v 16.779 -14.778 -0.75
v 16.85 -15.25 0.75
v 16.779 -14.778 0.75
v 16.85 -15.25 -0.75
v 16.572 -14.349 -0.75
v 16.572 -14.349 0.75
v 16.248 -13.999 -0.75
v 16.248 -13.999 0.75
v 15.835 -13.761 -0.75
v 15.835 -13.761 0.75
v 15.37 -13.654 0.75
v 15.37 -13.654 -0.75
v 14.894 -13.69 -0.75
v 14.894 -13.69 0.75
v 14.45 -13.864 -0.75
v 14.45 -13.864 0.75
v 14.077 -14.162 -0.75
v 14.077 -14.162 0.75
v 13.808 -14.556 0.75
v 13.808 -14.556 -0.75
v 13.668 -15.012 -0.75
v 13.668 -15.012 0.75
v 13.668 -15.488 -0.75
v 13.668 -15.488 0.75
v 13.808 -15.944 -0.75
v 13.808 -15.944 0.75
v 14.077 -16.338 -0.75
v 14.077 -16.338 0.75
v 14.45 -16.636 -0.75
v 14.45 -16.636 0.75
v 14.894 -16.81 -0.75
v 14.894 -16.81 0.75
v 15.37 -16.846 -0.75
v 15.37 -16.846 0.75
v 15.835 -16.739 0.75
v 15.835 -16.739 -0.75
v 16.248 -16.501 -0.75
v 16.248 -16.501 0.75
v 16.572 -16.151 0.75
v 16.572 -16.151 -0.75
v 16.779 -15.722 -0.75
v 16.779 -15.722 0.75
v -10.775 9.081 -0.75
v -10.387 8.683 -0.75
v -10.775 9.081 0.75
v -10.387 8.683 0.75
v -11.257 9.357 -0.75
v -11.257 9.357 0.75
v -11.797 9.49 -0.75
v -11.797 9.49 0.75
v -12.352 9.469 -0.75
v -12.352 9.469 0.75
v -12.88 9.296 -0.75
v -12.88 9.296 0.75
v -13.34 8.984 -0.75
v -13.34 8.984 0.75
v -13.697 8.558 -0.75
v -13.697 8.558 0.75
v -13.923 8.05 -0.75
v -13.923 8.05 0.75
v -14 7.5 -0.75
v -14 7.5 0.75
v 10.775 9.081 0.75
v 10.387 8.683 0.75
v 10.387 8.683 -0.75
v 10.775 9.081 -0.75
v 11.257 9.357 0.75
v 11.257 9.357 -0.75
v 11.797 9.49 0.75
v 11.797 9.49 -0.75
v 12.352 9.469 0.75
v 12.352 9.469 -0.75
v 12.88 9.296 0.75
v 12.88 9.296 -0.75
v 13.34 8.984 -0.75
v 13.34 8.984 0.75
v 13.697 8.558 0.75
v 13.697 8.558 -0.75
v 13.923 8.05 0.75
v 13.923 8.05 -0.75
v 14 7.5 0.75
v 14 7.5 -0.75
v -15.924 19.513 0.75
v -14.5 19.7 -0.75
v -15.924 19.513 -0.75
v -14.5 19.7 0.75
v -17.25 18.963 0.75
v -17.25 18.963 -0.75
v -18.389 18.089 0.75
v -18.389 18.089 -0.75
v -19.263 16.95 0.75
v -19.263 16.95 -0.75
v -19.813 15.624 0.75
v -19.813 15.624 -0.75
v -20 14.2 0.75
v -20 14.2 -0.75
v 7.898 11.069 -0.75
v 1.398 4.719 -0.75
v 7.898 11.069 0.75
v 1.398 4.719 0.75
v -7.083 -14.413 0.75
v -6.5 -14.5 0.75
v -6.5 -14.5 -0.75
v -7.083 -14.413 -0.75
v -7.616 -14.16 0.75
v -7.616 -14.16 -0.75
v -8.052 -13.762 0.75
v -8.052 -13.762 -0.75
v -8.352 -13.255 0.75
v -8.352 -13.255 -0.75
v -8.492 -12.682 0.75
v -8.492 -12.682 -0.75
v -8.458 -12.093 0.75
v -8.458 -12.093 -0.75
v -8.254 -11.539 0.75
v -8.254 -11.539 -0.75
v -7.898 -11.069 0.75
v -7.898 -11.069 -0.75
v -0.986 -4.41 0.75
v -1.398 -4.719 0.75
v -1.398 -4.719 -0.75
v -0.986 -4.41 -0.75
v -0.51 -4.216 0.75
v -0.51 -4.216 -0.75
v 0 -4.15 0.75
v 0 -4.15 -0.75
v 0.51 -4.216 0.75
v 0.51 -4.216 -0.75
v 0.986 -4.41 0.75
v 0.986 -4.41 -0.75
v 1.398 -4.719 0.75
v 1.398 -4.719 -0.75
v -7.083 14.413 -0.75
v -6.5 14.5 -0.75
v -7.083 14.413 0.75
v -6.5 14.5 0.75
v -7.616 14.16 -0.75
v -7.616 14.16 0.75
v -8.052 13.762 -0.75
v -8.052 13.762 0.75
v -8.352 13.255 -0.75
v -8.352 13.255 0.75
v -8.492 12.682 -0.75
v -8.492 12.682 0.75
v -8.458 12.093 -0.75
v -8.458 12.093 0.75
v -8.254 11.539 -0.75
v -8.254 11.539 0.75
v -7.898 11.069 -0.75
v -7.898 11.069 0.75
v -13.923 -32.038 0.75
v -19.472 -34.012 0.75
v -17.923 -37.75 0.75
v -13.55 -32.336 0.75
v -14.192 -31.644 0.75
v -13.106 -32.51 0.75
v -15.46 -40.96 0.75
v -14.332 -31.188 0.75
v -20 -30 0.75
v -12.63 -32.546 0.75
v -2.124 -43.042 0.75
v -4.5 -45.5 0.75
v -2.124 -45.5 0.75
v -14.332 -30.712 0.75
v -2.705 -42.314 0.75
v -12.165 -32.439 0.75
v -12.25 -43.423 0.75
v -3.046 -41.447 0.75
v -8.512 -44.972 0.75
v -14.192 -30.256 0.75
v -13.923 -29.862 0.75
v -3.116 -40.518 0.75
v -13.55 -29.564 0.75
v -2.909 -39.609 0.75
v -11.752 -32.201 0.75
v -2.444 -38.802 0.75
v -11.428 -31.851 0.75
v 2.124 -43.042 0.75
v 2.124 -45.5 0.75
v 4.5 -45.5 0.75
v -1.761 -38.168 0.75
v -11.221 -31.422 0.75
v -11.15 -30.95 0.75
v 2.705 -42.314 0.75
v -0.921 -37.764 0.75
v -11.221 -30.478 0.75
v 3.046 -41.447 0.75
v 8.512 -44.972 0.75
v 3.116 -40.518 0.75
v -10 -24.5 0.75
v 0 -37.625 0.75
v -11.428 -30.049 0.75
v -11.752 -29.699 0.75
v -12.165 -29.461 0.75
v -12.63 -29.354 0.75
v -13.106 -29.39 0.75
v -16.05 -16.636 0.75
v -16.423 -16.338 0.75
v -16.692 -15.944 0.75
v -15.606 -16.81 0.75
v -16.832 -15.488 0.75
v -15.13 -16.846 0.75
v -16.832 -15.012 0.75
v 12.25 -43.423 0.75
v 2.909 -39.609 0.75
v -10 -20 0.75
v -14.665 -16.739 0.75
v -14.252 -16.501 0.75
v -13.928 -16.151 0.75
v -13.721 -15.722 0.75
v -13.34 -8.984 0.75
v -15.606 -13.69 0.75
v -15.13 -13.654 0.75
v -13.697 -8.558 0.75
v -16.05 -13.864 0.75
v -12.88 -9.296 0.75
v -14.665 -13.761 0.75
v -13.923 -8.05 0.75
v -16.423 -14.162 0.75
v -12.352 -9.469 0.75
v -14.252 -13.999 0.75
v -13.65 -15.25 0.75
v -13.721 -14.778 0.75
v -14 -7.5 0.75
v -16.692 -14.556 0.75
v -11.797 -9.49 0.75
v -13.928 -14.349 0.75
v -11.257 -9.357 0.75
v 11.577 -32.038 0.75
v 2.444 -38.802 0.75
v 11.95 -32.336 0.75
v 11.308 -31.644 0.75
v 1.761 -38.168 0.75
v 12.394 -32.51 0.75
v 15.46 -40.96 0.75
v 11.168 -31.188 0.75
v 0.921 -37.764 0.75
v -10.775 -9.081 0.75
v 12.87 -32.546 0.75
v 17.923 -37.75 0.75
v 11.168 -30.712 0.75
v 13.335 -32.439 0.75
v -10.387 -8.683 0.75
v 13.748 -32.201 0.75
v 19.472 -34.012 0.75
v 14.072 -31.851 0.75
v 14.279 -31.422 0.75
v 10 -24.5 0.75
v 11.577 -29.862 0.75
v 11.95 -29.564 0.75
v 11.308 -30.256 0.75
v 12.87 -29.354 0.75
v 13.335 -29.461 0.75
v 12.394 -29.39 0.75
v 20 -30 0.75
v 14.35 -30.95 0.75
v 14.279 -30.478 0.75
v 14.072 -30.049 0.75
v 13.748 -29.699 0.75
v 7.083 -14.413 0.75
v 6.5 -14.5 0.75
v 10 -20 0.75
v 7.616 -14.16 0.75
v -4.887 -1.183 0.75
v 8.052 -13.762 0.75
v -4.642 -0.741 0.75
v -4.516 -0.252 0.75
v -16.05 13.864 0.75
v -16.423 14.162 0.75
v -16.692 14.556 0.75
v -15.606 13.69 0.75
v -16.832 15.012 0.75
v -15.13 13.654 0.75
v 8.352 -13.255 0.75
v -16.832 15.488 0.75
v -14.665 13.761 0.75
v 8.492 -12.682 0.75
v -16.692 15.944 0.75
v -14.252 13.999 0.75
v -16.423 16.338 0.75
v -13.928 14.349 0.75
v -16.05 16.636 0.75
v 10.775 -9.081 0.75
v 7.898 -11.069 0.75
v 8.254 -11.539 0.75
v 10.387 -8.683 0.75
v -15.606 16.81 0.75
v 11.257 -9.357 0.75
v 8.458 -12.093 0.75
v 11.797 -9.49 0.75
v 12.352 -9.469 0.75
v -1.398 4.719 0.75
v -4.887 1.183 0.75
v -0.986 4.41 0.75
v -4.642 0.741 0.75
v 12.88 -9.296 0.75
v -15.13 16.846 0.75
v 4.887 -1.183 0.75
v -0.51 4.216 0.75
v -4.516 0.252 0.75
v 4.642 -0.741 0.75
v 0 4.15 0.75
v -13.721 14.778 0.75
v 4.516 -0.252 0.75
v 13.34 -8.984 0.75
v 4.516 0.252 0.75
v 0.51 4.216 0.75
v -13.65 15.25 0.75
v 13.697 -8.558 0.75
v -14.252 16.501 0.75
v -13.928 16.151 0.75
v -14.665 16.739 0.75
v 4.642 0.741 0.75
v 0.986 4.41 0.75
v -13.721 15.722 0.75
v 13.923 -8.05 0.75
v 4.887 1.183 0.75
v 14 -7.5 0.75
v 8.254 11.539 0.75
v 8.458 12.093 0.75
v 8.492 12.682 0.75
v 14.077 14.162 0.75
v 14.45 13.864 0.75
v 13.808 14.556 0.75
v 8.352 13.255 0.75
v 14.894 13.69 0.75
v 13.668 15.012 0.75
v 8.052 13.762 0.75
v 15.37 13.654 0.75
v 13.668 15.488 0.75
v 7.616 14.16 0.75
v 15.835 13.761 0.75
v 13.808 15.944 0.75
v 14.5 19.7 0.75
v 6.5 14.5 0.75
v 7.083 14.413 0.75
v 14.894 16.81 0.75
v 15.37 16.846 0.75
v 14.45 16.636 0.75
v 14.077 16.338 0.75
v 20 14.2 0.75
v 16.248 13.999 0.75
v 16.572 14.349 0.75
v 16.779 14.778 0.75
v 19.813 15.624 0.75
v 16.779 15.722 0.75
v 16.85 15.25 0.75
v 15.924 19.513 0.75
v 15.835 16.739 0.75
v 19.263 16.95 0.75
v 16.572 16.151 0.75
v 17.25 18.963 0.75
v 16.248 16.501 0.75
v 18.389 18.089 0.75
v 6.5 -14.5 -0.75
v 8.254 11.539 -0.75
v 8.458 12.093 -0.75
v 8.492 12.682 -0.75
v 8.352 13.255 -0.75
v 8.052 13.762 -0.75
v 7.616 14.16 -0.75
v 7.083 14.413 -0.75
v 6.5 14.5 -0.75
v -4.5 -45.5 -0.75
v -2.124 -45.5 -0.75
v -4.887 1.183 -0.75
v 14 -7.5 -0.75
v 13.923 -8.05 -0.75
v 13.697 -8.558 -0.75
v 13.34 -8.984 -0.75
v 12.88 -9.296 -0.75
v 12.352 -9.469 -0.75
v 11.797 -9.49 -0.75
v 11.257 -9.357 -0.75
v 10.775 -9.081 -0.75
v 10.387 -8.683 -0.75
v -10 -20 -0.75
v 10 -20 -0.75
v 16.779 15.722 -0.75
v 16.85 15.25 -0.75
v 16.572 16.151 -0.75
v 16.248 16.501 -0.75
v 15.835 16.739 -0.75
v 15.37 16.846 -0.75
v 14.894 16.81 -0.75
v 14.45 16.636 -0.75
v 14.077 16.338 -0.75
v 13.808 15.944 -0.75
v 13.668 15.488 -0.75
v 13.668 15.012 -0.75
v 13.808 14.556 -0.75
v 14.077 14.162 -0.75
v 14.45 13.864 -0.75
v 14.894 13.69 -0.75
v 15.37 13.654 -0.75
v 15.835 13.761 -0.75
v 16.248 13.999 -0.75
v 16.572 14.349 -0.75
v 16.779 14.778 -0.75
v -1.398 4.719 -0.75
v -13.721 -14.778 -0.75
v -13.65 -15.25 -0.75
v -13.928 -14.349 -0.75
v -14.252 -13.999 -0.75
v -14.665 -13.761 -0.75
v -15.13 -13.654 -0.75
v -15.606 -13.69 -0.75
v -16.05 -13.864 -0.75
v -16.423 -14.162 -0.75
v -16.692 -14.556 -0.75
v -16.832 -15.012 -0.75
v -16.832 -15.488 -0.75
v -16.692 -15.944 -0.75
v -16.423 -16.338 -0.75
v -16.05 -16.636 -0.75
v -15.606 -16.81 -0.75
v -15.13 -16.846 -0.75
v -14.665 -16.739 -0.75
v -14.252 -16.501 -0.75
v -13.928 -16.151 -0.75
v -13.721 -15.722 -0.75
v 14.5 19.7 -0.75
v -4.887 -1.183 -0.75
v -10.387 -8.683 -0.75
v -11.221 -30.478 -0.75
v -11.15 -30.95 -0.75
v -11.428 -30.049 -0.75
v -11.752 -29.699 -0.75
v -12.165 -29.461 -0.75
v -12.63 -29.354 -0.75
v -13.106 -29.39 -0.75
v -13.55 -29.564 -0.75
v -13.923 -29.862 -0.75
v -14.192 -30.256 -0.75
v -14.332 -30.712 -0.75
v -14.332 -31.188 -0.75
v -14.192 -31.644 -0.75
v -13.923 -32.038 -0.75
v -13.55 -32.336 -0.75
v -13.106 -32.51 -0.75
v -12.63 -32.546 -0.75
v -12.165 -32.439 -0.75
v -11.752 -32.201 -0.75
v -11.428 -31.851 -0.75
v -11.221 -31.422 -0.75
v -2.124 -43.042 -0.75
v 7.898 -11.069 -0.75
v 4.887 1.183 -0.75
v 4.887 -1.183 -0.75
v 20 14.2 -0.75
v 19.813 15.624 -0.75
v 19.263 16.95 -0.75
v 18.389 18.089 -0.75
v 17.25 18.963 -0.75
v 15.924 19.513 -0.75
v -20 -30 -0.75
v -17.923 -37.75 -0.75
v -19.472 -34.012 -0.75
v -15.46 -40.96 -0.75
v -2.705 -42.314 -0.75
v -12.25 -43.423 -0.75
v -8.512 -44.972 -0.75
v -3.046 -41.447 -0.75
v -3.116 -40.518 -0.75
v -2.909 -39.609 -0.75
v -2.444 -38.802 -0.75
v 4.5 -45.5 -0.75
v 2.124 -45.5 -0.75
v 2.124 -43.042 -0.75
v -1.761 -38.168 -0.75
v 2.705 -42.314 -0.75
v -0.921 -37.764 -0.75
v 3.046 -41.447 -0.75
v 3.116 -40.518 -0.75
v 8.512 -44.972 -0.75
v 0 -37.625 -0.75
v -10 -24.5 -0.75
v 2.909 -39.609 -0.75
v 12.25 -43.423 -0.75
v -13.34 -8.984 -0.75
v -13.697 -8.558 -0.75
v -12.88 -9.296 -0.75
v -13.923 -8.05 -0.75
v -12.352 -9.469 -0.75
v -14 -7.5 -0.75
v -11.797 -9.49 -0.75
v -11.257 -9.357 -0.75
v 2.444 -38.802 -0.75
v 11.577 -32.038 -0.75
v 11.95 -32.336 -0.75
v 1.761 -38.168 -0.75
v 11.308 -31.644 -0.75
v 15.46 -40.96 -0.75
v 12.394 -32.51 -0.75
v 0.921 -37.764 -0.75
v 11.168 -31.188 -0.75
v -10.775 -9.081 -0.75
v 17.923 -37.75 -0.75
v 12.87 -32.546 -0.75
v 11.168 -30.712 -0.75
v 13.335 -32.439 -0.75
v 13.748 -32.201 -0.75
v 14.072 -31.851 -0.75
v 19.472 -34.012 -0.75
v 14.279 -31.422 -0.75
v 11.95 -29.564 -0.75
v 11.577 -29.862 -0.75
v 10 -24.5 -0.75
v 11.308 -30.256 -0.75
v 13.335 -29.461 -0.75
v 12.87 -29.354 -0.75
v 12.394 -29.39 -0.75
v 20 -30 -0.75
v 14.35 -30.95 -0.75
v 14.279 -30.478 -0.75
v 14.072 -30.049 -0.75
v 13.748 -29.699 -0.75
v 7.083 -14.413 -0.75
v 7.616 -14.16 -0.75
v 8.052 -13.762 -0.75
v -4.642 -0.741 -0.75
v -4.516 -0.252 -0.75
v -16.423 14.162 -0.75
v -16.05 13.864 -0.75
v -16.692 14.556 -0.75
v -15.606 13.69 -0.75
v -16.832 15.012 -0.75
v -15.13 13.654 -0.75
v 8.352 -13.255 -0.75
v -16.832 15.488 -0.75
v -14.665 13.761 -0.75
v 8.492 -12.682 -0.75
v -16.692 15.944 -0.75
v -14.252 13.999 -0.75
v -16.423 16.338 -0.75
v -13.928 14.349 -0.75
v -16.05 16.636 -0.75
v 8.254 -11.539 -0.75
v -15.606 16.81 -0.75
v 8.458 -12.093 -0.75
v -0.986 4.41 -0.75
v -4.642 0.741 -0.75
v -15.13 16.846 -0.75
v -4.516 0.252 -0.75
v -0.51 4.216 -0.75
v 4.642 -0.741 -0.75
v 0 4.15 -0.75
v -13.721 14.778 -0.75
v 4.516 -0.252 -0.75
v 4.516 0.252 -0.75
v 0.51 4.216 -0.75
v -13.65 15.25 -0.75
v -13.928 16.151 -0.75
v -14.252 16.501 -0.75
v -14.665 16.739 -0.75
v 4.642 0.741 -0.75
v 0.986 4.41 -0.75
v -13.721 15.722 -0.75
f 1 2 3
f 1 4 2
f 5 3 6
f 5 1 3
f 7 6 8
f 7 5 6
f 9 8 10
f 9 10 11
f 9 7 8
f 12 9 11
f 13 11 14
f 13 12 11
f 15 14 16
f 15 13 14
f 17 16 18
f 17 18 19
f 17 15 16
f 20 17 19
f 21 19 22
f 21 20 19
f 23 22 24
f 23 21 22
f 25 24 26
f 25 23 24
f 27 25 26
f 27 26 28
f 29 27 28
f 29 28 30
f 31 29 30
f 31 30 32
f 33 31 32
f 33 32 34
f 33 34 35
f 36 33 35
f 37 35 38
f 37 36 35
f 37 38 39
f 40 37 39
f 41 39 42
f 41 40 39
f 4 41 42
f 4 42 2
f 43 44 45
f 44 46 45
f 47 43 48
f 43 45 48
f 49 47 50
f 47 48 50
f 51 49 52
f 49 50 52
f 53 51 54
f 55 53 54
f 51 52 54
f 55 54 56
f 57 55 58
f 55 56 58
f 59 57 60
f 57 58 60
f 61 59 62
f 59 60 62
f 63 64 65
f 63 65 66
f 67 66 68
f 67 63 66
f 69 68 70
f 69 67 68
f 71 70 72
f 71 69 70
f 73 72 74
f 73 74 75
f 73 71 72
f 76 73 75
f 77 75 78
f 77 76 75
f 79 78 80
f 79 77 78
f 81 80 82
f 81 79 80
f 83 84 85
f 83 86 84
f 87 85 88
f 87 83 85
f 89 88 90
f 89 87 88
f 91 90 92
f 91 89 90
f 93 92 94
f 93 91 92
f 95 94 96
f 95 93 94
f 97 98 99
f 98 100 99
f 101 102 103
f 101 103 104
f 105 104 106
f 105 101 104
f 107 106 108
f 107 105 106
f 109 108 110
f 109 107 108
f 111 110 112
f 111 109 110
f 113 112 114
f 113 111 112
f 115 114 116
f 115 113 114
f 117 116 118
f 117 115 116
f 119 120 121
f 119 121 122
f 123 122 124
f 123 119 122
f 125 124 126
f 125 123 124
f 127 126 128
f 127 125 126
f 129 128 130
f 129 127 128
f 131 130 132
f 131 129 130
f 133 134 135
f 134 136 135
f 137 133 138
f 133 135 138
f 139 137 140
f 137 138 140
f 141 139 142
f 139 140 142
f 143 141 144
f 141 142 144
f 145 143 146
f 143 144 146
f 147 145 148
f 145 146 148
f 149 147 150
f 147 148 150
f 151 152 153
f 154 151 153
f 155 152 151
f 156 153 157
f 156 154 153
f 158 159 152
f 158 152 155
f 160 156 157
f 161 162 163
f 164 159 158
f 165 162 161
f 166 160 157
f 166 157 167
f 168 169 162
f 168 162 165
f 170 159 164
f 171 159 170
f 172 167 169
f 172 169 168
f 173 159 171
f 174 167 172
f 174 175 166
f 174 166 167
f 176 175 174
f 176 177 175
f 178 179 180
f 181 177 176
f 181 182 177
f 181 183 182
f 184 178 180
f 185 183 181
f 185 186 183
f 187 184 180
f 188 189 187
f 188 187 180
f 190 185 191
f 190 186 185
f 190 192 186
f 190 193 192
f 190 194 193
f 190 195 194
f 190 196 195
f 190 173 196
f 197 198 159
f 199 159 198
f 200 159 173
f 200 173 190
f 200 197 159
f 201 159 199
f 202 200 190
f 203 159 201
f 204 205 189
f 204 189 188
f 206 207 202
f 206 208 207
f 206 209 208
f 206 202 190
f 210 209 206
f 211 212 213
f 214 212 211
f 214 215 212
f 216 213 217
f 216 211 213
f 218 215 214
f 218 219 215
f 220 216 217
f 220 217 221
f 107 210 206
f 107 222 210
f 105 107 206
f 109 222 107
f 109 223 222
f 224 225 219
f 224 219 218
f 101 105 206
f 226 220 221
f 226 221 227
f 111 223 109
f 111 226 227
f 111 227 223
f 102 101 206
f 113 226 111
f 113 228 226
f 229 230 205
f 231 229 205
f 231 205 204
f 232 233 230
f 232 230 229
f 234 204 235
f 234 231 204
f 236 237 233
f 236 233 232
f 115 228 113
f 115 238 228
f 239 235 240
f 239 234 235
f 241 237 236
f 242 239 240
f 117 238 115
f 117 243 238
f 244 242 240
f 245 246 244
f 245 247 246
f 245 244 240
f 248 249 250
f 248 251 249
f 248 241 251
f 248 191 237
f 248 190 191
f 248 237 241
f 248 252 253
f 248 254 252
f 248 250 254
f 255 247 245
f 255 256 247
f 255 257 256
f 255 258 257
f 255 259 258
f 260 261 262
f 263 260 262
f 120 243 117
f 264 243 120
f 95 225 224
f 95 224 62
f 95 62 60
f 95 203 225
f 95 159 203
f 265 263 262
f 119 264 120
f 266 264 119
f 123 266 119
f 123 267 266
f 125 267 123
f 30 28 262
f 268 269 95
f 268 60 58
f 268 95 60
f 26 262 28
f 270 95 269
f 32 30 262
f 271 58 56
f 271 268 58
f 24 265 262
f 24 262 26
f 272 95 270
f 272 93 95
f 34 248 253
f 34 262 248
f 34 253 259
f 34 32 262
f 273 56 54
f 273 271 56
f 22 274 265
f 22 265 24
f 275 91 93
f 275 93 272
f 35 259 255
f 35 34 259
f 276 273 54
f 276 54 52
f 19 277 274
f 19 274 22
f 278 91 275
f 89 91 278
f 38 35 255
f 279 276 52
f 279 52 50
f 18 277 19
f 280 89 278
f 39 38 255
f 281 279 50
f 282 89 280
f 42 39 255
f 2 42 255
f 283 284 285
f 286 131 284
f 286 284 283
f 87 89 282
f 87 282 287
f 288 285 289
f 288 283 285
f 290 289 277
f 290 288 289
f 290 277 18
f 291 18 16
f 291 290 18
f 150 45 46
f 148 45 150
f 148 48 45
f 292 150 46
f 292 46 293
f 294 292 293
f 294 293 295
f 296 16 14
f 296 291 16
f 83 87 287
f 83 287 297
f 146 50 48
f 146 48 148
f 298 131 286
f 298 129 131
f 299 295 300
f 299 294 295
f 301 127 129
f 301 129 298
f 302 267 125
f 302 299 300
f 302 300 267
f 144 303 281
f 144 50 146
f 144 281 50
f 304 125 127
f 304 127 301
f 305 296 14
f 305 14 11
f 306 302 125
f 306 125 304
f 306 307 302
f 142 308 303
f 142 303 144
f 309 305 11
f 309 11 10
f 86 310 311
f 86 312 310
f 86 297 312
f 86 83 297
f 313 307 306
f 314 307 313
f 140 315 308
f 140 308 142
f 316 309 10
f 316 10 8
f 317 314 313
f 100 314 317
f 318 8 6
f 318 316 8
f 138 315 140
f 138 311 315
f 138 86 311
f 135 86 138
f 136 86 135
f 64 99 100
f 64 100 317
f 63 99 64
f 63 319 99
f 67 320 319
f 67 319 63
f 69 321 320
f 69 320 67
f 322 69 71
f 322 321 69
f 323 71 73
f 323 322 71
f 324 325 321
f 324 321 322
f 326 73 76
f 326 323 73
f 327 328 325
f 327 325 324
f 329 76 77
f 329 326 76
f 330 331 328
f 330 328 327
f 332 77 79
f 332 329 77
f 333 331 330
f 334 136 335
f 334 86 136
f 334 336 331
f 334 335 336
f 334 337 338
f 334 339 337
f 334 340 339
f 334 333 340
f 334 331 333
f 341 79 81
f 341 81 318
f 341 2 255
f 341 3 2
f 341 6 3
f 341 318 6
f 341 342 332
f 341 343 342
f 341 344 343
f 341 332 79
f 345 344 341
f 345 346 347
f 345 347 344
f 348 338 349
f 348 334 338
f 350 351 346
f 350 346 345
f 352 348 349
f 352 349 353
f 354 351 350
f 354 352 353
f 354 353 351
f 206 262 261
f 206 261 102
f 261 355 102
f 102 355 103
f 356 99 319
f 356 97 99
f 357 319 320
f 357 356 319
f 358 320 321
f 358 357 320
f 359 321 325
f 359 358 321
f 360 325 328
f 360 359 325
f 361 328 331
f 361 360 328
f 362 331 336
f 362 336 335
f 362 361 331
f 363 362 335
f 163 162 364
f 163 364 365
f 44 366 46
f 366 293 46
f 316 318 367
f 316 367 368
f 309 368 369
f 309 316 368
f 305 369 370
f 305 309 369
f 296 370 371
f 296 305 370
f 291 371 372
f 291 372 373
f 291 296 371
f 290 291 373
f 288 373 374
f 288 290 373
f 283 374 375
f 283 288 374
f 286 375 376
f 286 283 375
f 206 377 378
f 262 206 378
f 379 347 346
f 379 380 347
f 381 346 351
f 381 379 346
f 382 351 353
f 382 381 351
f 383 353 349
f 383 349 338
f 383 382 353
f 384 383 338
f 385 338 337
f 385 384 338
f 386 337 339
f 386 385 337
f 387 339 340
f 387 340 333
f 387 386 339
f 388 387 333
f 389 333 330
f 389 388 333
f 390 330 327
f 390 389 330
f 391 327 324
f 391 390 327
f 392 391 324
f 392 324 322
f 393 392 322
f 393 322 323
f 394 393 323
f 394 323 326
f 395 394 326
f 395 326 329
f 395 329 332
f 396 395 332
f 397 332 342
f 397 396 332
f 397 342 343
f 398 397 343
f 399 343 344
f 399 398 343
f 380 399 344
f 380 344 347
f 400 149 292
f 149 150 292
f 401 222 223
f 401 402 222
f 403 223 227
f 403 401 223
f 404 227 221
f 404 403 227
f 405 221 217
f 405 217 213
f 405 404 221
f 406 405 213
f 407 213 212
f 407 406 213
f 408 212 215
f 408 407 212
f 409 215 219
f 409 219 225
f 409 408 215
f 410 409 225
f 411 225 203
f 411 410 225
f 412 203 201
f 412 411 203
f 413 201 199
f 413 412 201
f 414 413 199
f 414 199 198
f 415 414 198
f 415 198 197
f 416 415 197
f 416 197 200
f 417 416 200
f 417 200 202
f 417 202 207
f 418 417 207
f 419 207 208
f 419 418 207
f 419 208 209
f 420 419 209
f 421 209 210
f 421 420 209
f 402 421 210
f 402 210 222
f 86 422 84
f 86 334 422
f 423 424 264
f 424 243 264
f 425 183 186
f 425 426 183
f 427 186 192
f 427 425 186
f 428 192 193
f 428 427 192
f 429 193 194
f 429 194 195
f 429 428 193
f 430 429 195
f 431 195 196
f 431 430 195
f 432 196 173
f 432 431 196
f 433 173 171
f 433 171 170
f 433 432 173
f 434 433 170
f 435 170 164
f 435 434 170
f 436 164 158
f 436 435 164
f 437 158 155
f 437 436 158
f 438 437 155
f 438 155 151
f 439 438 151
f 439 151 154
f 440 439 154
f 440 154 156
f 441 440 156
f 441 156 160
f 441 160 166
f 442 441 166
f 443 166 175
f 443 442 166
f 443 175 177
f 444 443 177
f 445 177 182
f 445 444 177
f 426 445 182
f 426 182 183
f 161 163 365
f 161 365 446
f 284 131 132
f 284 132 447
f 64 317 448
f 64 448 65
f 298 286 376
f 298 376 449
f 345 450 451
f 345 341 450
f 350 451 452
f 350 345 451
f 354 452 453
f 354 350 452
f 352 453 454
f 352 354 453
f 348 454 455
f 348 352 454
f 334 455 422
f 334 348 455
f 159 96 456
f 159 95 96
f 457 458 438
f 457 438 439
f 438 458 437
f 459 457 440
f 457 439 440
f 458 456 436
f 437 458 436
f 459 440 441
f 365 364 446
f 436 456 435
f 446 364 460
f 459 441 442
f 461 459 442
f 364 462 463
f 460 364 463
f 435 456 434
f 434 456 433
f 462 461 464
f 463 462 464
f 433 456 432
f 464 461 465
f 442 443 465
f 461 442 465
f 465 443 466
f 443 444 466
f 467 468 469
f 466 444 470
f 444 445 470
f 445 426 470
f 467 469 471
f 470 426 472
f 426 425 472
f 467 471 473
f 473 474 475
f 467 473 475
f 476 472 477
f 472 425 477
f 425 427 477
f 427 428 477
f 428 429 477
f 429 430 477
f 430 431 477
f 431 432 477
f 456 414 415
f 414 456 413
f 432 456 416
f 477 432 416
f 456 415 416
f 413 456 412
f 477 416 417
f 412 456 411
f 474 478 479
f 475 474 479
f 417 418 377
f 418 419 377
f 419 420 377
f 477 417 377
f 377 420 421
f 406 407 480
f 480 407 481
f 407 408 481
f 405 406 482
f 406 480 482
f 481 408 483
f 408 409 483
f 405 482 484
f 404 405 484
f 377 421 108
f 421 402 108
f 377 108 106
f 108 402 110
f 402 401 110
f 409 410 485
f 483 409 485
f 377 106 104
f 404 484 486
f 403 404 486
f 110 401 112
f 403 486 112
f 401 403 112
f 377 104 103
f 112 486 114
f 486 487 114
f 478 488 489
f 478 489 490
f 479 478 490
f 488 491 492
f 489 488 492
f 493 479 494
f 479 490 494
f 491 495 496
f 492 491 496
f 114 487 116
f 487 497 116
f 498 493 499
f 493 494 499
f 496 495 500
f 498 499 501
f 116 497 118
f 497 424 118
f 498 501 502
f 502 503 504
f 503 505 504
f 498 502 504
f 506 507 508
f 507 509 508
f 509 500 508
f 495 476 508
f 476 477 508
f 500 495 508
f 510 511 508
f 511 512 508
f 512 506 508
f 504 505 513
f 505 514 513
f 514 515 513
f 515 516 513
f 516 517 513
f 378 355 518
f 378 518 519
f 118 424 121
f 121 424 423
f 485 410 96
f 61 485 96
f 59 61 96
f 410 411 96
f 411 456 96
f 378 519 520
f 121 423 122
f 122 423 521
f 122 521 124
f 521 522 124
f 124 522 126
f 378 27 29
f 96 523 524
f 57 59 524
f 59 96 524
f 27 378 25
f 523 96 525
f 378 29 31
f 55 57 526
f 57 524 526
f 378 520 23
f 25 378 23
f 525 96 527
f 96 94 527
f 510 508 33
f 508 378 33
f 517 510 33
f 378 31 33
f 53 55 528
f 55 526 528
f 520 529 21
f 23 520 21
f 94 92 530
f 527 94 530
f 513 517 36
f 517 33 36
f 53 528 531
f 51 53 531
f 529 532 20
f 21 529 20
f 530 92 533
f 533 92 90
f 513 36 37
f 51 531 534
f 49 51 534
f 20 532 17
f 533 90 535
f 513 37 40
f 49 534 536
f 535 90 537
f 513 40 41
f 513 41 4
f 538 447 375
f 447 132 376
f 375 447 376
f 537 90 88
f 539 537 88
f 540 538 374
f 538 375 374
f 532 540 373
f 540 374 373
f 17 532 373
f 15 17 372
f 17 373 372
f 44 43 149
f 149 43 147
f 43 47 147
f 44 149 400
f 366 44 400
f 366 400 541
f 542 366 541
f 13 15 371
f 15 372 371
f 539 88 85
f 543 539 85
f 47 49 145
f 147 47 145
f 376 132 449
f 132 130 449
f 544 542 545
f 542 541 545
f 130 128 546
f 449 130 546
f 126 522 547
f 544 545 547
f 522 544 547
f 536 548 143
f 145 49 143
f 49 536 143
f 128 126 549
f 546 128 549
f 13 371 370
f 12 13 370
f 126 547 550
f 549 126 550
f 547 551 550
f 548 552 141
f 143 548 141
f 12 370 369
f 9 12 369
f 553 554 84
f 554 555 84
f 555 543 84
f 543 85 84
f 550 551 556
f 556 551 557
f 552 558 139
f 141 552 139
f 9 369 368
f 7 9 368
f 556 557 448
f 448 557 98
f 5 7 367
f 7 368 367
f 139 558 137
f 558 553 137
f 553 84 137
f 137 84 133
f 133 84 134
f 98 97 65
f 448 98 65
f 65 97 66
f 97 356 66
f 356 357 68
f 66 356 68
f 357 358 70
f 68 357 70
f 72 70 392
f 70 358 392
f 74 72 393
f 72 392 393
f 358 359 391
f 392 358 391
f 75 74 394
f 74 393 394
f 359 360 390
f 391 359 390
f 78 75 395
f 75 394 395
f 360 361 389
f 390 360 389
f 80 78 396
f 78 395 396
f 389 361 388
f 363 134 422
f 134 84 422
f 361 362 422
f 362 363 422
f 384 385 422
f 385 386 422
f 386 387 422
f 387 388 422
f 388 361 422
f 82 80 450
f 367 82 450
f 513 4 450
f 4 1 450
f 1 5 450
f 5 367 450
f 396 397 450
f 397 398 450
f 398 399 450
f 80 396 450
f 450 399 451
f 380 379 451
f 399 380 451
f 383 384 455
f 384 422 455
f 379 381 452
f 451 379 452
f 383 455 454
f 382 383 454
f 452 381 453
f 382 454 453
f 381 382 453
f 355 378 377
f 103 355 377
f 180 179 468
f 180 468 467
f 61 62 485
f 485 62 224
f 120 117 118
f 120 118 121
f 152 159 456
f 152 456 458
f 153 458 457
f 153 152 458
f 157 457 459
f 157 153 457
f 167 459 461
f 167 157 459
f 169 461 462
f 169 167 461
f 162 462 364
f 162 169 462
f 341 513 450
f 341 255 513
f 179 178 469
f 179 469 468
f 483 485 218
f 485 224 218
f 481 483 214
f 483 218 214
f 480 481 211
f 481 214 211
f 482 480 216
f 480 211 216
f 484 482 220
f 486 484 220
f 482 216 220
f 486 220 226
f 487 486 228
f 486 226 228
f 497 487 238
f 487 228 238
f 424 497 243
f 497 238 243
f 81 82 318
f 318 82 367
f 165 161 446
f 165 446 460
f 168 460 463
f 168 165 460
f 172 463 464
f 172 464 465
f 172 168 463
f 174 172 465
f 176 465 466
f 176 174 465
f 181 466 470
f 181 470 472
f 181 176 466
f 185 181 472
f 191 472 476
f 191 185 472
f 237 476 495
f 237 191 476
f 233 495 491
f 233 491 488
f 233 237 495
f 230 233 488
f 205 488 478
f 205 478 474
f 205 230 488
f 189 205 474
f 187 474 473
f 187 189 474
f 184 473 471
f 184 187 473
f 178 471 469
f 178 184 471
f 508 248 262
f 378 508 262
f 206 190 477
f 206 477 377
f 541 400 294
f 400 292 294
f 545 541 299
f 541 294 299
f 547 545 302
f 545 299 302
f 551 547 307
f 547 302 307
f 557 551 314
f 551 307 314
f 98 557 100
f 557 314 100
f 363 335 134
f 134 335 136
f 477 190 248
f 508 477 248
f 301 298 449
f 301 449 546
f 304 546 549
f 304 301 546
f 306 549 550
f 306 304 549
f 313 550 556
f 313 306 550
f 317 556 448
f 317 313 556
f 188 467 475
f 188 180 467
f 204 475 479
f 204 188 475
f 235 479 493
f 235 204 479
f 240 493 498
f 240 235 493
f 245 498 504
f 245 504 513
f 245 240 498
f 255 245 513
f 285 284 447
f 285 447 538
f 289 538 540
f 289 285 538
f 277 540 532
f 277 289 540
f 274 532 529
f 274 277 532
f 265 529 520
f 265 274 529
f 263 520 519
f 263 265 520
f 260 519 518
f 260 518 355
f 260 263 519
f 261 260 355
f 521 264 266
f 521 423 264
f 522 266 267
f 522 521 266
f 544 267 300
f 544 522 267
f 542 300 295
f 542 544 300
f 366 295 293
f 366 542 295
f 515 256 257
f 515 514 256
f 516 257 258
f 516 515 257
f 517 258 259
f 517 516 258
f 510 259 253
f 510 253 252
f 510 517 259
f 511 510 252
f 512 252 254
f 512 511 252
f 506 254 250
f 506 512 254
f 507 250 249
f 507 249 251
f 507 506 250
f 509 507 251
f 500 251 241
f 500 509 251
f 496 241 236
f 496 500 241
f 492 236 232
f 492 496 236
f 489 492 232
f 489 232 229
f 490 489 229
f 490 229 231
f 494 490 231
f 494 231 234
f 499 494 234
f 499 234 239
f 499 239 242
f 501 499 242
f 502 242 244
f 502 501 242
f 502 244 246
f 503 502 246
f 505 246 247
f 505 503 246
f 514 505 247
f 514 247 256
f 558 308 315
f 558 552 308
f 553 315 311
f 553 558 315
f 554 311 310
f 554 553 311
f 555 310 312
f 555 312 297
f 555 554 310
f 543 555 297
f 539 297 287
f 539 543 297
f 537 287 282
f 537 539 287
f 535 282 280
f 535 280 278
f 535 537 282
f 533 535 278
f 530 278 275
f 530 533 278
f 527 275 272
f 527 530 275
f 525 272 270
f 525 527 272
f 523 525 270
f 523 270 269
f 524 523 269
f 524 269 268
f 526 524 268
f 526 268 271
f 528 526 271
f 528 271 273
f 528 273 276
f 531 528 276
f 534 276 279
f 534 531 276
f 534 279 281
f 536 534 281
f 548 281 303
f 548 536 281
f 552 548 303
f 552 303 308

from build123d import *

# Parameters (mm, degrees)
SKETCH1_R           = 1.6
SKETCH1_W           = 20
SKETCH1_H           = 4.5
BOSS_EXTRUDE1_DEPTH = 0.75


with BuildPart() as part:
    # Sketch1 → Boss-Extrude1 (new, symmetric)
    with BuildSketch(Plane.XY):
        with BuildLine():
            Line((-20, 14.2), (-20, -30))
            ThreePointArc((-20, -30), (-15.460155108, -40.960155108), (-4.5, -45.5))
            Line((-4.5, -45.5), (-2.123950753, -45.5))
            Line((-2.123950753, -45.5), (-2.123950753, -43.0422605))
            ThreePointArc((-2.123950753, -43.0422605), (0, -37.625), (2.123950753, -43.0422605))
            Line((2.123950753, -43.0422605), (2.123950753, -45.5))
            Line((2.123950753, -45.5), (4.5, -45.5))
            ThreePointArc((4.5, -45.5), (15.460155108, -40.960155108), (20, -30))
            Line((20, -30), (20, 14.2))
            ThreePointArc((20, 14.2), (18.389087297, 18.089087297), (14.5, 19.7))
            Line((14.5, 19.7), (-14.5, 19.7))
            ThreePointArc((-14.5, 19.7), (-18.389087297, 18.089087297), (-20, 14.2))
        make_face()
        with Locations((-15.25, 15.25)):
            Circle(SKETCH1_R, mode=Mode.SUBTRACT)
        with Locations((15.25, 15.25)):
            Circle(SKETCH1_R, mode=Mode.SUBTRACT)
        with Locations((15.25, -15.25)):
            Circle(SKETCH1_R, mode=Mode.SUBTRACT)
        with Locations((-15.25, -15.25)):
            Circle(SKETCH1_R, mode=Mode.SUBTRACT)
        with Locations((12.75, -30.95)):
            Circle(SKETCH1_R, mode=Mode.SUBTRACT)
        with Locations((-12.75, -30.95)):
            Circle(SKETCH1_R, mode=Mode.SUBTRACT)
        with Locations((0, -22.25)):
            Rectangle(SKETCH1_W, SKETCH1_H, mode=Mode.SUBTRACT)
        with BuildLine():
            Line((-14, 7.5), (-14, -7.5))
            ThreePointArc((-14, -7.5), (-12.622245939, -9.400739328), (-10.387190008, -8.682727327))
            Line((-10.387190008, -8.682727327), (-4.887190008, -1.182727327))
            ThreePointArc((-4.887190008, -1.182727327), (-4.5, 0), (-4.887190008, 1.182727327))
            Line((-4.887190008, 1.182727327), (-10.387190008, 8.682727327))
            ThreePointArc((-10.387190008, 8.682727327), (-12.622245939, 9.400739328), (-14, 7.5))
        make_face(mode=Mode.SUBTRACT)
        with BuildLine():
            Line((4.887190008, 1.182727327), (10.387190008, 8.682727327))
            ThreePointArc((10.387190008, 8.682727327), (12.622245939, 9.400739328), (14, 7.5))
            Line((14, 7.5), (14, -7.5))
            ThreePointArc((14, -7.5), (12.622245939, -9.400739328), (10.387190008, -8.682727327))
            Line((10.387190008, -8.682727327), (4.887190008, -1.182727327))
            ThreePointArc((4.887190008, -1.182727327), (4.5, 0), (4.887190008, 1.182727327))
        make_face(mode=Mode.SUBTRACT)
        with BuildLine():
            Line((-7.897610015, 11.069375575), (-1.397610015, 4.719375575))
            ThreePointArc((-1.397610015, 4.719375575), (0, 4.15), (1.397610015, 4.719375575))
            Line((1.397610015, 4.719375575), (7.897610015, 11.069375575))
            ThreePointArc((7.897610015, 11.069375575), (8.352194489, 13.254569795), (6.5, 14.5))
            Line((6.5, 14.5), (-6.5, 14.5))
            ThreePointArc((-6.5, 14.5), (-8.352194489, 13.254569795), (-7.897610015, 11.069375575))
        make_face(mode=Mode.SUBTRACT)
        with BuildLine():
            Line((6.5, -14.5), (-6.5, -14.5))
            ThreePointArc((-6.5, -14.5), (-8.352194489, -13.254569795), (-7.897610015, -11.069375575))
            Line((-7.897610015, -11.069375575), (-1.397610015, -4.719375575))
            ThreePointArc((-1.397610015, -4.719375575), (0, -4.15), (1.397610015, -4.719375575))
            Line((1.397610015, -4.719375575), (7.897610015, -11.069375575))
            ThreePointArc((7.897610015, -11.069375575), (8.352194489, -13.254569795), (6.5, -14.5))
        make_face(mode=Mode.SUBTRACT)
    extrude(amount=BOSS_EXTRUDE1_DEPTH, both=True)


solid = part.part
